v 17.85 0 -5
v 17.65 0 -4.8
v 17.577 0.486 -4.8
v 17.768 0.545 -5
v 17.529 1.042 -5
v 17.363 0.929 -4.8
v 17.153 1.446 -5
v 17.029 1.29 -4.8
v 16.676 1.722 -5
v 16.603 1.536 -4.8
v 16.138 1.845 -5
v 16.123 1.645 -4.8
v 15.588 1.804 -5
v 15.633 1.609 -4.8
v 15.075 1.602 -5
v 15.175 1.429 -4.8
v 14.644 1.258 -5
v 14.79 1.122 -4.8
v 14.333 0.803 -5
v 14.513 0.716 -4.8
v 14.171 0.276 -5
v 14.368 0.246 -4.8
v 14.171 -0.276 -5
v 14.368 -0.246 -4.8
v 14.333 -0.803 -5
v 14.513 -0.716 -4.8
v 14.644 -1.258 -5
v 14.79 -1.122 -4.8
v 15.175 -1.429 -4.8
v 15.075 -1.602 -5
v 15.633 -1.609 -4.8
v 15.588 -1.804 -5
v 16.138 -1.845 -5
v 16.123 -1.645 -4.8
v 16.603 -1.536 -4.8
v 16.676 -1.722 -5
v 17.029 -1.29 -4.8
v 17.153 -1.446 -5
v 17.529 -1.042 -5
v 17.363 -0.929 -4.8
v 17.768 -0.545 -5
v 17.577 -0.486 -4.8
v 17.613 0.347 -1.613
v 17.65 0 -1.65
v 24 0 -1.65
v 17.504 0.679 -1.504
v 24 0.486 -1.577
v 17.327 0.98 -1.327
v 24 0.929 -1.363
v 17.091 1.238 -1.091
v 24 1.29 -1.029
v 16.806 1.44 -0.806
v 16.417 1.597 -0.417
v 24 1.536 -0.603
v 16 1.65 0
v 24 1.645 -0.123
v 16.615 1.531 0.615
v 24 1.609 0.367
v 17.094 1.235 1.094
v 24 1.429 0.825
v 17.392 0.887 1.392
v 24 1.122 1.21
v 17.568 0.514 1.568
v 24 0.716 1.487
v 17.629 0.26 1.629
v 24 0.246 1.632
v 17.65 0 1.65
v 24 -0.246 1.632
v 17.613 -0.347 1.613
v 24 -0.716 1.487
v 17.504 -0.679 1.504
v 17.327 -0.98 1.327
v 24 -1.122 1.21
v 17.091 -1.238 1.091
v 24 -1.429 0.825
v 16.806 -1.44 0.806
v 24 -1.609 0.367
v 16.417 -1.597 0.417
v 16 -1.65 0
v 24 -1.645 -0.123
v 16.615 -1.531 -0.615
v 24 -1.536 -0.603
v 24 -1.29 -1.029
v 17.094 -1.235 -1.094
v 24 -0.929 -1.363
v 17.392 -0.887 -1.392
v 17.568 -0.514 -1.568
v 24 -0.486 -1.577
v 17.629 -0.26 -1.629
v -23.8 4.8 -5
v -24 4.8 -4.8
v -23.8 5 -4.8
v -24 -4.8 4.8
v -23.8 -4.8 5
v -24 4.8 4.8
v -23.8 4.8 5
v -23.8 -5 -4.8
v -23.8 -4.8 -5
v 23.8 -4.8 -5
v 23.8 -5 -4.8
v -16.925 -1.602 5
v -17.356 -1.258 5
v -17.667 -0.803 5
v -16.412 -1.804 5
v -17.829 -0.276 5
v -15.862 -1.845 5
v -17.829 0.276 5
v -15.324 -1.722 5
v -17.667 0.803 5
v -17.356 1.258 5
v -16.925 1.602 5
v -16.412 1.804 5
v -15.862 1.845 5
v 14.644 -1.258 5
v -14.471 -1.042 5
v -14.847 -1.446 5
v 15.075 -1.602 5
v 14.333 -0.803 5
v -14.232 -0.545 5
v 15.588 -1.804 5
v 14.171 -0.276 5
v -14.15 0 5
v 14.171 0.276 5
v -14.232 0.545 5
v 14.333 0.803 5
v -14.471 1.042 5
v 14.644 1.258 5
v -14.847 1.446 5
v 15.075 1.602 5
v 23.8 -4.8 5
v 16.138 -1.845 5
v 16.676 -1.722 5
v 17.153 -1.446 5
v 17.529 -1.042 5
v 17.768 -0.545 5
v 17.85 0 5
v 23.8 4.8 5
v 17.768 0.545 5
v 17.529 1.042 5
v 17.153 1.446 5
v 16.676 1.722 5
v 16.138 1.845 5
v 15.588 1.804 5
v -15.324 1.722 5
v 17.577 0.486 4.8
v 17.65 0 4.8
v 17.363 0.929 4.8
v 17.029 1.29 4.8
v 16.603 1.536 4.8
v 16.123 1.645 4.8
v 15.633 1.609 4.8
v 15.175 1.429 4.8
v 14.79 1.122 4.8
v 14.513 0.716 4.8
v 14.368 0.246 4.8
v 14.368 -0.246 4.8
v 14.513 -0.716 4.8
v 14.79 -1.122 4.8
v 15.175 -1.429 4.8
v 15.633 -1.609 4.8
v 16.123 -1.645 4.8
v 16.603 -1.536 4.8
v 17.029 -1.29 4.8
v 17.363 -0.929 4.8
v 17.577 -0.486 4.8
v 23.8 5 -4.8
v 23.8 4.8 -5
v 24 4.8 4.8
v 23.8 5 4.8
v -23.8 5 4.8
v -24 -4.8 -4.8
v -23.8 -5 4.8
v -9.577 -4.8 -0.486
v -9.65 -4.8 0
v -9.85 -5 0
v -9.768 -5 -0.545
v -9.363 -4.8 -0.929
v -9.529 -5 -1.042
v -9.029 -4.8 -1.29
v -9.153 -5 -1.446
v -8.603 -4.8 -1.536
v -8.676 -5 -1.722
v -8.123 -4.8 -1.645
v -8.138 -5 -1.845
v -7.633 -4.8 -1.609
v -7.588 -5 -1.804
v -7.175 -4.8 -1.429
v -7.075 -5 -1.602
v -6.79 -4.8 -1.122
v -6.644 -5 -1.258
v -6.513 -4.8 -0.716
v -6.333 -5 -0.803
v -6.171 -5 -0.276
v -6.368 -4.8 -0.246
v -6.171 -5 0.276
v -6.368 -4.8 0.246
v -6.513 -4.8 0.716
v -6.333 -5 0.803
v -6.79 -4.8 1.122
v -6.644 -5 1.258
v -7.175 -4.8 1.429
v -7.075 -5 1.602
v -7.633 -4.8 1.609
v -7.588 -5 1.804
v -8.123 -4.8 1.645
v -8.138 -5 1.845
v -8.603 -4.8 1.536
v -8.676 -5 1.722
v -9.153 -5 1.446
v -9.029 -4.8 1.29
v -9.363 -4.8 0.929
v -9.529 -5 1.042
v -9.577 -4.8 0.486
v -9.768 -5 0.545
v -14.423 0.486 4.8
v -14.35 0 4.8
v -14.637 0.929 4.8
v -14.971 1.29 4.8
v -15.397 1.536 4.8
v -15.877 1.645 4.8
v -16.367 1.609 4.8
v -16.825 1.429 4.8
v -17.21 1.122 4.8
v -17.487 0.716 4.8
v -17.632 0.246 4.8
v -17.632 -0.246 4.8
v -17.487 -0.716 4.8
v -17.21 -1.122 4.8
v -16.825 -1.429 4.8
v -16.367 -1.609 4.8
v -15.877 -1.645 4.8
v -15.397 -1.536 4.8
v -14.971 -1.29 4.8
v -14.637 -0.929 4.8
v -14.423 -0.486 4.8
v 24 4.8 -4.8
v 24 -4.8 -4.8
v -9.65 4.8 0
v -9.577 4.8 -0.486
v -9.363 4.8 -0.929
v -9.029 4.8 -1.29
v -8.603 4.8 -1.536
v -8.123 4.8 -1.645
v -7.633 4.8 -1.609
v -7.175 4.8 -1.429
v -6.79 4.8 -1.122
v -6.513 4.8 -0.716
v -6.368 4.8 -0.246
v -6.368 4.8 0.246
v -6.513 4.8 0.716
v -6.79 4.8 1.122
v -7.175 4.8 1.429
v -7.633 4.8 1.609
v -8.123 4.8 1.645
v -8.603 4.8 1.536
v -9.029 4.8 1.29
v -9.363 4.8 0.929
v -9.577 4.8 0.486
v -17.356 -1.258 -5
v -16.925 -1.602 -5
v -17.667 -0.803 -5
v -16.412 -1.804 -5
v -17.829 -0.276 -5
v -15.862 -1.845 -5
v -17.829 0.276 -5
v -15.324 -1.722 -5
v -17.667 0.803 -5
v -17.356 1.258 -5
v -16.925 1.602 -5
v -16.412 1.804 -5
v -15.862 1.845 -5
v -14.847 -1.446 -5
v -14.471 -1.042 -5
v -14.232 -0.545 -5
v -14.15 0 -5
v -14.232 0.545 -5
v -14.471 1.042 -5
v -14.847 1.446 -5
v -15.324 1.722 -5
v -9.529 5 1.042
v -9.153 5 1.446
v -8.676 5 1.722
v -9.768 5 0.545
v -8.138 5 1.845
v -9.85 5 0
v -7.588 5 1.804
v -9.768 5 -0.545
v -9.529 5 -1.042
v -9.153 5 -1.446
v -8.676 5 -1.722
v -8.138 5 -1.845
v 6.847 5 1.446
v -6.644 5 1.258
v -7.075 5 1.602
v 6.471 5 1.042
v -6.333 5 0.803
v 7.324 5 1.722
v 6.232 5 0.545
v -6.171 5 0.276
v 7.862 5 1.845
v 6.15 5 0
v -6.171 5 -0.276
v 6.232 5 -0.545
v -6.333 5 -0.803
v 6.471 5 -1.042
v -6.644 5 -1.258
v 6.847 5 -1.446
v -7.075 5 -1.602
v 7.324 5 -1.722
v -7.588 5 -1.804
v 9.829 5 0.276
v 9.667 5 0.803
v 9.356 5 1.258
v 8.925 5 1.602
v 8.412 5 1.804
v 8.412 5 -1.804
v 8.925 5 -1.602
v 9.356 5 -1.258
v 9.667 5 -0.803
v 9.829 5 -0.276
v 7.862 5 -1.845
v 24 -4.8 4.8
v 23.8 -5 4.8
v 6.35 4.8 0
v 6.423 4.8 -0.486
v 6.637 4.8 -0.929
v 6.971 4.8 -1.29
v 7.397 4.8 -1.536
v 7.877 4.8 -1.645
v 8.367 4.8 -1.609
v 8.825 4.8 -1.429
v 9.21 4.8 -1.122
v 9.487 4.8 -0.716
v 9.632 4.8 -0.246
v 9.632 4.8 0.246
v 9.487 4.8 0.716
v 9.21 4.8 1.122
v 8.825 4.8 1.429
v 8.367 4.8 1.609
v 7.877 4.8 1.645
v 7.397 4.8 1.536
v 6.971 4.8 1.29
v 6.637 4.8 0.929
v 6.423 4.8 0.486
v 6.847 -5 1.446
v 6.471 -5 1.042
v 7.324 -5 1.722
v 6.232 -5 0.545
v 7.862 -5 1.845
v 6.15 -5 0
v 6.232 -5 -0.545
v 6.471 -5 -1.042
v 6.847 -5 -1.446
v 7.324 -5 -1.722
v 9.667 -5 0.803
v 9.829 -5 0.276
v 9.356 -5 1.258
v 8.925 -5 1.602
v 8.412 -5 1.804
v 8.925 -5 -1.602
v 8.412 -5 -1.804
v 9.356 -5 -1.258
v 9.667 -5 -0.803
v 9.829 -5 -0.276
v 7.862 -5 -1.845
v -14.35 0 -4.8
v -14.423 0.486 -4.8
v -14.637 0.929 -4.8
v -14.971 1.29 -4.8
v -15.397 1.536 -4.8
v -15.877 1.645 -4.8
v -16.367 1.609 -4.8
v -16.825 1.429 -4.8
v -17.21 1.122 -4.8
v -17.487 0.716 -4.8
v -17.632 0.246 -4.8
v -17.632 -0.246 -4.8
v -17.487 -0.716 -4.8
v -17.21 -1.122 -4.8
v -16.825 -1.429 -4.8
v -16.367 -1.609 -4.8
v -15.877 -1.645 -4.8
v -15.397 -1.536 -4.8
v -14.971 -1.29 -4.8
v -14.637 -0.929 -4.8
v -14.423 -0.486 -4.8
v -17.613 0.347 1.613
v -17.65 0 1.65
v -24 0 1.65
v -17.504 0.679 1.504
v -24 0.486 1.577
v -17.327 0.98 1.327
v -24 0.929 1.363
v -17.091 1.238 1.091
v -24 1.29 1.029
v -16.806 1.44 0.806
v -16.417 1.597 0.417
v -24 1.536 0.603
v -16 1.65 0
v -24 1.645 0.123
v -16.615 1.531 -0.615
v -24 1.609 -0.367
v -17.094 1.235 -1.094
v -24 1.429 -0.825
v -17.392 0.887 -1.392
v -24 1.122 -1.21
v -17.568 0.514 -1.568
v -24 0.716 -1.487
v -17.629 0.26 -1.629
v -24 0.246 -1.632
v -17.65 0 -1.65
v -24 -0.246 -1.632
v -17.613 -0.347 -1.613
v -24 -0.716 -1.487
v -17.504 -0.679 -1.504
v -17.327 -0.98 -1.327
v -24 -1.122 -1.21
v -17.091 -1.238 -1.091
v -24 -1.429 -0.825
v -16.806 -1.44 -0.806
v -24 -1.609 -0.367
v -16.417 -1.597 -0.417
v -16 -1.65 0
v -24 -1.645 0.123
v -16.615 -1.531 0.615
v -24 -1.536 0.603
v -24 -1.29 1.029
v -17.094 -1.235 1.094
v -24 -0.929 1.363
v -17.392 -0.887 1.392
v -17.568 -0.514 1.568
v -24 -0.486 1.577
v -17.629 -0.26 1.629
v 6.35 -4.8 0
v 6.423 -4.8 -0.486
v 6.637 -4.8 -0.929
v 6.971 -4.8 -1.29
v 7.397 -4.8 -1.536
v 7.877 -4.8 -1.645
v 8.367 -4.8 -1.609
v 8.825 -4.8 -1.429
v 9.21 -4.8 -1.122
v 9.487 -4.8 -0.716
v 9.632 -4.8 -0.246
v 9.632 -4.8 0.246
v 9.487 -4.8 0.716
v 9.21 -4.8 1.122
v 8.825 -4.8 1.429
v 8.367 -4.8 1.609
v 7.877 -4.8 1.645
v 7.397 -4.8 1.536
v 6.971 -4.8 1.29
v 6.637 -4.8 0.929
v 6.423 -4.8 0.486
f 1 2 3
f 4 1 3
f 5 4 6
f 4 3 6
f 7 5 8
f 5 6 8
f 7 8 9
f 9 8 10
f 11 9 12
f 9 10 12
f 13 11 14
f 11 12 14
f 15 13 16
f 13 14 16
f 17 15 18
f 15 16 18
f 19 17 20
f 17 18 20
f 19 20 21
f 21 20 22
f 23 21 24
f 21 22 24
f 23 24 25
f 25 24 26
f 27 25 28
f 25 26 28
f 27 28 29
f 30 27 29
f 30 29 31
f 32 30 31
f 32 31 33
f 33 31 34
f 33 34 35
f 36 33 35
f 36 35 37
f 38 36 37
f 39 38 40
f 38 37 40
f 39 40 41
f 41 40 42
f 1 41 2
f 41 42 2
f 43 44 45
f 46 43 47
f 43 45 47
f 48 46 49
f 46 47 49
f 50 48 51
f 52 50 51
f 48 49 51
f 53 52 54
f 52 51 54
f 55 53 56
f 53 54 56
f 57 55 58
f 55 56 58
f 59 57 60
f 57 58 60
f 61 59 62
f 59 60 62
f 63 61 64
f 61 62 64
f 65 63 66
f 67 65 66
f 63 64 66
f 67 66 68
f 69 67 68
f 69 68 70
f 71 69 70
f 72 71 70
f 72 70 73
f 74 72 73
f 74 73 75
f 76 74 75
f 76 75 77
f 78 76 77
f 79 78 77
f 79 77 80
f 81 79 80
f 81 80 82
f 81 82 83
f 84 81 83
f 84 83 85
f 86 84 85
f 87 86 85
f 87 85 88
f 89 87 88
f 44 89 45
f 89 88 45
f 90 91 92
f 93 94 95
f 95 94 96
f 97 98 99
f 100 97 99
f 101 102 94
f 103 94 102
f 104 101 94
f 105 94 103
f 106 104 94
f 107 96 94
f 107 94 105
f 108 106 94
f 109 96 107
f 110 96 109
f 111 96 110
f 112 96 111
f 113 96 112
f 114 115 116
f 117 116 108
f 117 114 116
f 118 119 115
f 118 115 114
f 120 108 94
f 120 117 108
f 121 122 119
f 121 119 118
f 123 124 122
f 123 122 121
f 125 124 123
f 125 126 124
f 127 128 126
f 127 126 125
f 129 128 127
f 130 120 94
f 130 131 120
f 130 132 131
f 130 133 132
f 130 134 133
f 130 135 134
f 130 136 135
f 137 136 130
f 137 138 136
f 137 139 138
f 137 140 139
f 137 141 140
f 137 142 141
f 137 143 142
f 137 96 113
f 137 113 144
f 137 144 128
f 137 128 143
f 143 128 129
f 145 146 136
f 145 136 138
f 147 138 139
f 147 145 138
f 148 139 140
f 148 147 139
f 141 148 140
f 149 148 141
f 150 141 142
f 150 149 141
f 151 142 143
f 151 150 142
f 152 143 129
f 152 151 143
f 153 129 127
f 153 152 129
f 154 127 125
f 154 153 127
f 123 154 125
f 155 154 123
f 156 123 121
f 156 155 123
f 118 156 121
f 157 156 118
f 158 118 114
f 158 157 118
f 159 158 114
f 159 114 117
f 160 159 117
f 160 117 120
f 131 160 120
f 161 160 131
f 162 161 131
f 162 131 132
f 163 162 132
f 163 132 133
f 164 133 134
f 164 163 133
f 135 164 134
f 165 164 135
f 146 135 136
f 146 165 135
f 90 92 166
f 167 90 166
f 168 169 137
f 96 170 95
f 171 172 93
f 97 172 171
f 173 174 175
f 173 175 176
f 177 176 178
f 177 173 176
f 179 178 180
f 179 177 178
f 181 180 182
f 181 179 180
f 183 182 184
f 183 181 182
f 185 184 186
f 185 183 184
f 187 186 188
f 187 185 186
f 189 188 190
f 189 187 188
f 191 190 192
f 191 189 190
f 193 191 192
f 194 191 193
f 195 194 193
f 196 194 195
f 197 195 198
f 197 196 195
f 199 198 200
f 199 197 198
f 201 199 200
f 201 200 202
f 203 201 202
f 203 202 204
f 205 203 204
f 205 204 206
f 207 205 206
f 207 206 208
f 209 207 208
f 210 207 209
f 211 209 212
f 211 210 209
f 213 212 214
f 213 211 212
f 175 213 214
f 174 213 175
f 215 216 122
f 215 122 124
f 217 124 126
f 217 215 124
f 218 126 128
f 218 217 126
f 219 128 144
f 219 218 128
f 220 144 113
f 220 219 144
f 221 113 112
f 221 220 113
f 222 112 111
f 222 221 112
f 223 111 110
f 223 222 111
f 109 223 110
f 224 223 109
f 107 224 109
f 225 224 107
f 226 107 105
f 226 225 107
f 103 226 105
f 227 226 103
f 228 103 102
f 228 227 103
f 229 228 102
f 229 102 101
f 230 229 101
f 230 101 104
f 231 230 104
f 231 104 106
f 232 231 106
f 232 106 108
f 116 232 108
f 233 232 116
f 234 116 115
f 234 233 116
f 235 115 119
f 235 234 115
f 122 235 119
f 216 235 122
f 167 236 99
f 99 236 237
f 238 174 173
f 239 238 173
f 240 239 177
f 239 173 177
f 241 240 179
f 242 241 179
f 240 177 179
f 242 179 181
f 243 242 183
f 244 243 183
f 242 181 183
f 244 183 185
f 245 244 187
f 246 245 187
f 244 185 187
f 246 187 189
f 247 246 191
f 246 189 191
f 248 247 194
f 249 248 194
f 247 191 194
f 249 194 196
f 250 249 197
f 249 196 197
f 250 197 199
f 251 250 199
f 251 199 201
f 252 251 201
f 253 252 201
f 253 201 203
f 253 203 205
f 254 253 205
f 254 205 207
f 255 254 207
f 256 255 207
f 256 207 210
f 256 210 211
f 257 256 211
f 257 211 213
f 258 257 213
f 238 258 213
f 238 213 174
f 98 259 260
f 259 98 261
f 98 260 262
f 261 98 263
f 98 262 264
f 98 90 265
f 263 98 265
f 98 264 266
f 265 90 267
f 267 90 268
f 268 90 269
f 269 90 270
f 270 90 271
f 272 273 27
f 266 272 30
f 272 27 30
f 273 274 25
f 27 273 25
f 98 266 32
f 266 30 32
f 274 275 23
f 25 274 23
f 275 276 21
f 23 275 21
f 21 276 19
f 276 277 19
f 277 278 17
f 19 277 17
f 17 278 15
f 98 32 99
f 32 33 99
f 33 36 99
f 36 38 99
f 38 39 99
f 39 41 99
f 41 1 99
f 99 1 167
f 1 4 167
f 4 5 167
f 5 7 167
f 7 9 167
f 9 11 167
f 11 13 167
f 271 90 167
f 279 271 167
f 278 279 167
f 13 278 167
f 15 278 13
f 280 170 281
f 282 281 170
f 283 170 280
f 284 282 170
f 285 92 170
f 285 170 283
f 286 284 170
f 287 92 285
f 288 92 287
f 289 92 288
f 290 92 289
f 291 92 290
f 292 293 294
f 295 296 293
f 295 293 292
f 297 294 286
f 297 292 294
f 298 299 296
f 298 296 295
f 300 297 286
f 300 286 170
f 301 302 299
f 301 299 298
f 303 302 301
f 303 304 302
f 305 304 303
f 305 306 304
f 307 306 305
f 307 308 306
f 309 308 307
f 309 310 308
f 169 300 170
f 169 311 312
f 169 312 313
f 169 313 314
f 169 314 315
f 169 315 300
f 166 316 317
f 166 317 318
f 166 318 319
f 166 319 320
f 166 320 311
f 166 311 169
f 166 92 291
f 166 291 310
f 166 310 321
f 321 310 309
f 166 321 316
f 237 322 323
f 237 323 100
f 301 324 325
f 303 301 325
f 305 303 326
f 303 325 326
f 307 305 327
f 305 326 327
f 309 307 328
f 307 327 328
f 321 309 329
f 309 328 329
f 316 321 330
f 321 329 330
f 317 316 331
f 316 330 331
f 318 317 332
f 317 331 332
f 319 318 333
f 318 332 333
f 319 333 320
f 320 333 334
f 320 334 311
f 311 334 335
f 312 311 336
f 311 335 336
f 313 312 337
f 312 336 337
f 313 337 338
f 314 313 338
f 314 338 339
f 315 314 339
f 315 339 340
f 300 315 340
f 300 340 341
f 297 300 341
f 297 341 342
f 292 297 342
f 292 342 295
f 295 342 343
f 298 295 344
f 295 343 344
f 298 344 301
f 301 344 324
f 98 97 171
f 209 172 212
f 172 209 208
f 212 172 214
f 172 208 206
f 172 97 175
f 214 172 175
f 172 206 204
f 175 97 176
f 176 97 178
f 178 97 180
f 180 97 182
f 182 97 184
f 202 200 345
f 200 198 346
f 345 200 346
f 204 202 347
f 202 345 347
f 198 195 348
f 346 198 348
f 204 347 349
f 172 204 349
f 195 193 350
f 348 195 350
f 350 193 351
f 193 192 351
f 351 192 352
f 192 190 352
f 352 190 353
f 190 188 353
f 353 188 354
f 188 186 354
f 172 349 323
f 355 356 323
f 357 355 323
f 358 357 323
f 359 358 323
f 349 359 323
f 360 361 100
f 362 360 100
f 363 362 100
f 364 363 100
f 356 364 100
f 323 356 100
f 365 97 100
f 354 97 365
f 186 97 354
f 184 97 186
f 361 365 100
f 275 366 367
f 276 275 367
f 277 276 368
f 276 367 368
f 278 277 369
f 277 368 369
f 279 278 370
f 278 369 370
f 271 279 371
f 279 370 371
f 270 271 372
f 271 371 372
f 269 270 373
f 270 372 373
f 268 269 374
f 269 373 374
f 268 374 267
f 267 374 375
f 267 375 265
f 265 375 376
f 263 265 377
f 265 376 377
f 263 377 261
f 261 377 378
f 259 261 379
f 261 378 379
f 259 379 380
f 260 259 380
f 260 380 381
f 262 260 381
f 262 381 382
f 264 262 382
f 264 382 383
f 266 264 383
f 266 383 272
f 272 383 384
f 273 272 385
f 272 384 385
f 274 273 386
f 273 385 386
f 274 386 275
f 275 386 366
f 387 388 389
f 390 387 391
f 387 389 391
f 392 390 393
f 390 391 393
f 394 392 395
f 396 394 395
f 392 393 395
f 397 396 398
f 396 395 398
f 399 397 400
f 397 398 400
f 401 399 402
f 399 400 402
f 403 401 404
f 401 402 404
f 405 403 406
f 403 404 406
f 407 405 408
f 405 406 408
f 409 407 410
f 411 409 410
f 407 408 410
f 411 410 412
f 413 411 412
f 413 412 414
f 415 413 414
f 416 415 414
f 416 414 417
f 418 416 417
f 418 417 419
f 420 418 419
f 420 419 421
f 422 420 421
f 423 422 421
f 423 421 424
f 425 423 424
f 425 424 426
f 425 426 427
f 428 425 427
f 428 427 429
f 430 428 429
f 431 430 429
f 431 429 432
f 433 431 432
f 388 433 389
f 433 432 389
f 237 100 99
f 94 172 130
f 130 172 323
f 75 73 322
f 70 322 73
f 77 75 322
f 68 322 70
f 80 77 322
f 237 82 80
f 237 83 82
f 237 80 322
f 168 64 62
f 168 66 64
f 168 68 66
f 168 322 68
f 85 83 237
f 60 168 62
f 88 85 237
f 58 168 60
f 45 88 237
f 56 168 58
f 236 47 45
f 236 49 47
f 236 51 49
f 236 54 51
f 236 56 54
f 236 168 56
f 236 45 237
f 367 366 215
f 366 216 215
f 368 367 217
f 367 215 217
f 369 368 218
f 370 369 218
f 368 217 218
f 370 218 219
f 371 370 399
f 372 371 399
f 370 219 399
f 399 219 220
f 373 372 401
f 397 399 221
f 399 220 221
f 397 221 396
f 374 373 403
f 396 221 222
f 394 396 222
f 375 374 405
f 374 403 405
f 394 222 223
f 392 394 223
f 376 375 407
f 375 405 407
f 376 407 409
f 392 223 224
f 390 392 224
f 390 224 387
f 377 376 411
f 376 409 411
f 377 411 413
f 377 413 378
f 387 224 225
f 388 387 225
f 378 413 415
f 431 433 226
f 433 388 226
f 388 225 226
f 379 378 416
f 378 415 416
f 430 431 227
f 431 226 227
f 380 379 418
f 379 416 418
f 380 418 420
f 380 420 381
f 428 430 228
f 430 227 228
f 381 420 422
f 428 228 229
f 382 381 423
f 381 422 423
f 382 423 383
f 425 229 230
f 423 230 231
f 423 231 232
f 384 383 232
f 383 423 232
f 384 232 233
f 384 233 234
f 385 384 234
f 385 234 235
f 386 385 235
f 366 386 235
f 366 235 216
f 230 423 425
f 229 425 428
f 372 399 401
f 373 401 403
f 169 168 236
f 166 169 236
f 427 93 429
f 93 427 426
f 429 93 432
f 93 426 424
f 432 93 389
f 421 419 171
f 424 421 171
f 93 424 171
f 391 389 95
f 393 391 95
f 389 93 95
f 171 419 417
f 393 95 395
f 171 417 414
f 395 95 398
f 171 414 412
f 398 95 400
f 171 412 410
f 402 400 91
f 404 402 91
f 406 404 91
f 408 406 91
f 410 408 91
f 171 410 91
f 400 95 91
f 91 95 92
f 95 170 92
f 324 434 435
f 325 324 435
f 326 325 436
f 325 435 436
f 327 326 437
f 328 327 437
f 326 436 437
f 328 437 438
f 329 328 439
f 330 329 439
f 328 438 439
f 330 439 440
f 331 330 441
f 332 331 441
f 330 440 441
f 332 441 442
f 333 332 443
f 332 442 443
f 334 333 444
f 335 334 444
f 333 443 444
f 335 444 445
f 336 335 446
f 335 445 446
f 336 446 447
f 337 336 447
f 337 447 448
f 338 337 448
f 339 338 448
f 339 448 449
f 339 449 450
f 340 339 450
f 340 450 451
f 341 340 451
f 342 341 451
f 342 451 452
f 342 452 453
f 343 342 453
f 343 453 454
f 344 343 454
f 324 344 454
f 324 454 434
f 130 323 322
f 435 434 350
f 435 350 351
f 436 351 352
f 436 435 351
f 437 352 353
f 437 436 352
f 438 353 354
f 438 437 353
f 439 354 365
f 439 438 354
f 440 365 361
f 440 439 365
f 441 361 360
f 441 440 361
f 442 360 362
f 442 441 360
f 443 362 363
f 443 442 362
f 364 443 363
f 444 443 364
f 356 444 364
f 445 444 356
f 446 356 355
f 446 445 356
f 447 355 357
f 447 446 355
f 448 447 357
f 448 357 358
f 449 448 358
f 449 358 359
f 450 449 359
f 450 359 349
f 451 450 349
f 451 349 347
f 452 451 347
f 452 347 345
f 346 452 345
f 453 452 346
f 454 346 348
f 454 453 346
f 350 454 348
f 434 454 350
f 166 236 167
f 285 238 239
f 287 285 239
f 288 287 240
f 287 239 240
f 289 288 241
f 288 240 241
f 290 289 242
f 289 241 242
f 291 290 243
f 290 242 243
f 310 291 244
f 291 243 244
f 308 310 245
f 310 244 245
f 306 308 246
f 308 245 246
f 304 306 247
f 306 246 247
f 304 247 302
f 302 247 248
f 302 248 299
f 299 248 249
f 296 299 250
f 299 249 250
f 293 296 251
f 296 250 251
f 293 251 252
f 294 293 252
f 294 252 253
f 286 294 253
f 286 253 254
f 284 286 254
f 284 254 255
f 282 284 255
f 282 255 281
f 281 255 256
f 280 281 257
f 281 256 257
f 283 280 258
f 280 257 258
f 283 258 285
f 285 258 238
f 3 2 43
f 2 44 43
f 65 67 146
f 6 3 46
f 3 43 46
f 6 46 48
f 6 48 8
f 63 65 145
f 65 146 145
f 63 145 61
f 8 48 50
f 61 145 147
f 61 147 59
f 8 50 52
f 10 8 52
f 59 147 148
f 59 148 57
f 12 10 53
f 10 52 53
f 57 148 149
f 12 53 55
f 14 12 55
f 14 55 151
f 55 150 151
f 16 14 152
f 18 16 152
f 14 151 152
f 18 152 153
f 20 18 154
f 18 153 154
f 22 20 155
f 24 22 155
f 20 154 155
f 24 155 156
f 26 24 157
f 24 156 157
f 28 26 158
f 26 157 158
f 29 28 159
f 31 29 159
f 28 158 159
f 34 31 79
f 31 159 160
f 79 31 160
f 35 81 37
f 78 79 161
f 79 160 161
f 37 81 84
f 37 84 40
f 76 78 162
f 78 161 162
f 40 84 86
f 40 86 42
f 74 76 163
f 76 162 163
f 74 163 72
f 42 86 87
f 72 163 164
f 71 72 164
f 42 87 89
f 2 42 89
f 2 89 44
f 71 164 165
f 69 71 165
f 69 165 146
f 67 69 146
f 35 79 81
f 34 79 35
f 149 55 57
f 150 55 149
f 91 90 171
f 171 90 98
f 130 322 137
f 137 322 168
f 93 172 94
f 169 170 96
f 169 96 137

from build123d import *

# Parameters (mm, degrees)
SKETCH_1_W              = 48
SKETCH_1_H              = 10
EXTRUDE_1_DEPTH         = 5
HOLE_WIZARD_M4_1_D      = 3.3
HOLE_WIZARD_M4_2_D      = 3.3
CHAMFER_1_SIZE          = 0.2
HOLE_WIZARD_M4_3_REACH  = 50.518
HOLE_WIZARD_M4_3_BORE_R = 1.65
HOLE_WIZARD_M4_4_REACH  = 50.518
HOLE_WIZARD_M4_4_BORE_R = 1.65


with BuildPart() as part:
    # 草图1 → 凸台-拉伸1 (new, symmetric)
    with BuildSketch(Plane(origin=(0, 0, 0), x_dir=(1, 0, 0), z_dir=(0, 1, 0))):
        Rectangle(SKETCH_1_W, SKETCH_1_H)
    extrude(amount=EXTRUDE_1_DEPTH, both=True)

    # M4 螺纹孔1 (through all)
    with Locations(Plane(origin=(0, 5, 0), x_dir=(1, 0, 0), z_dir=(0, 1, 0))):
        with Locations((-8, 0), (8, 0)):
            Hole(HOLE_WIZARD_M4_1_D / 2)

    # M4 螺纹孔2 (through all)
    with Locations(Plane(origin=(0, 0, -5), x_dir=(-1, 0, 0), z_dir=(0, 0, -1))):
        with Locations((-16, 0), (16, 0)):
            Hole(HOLE_WIZARD_M4_2_D / 2)

    # 倒角1
    chamfer_1_edges = [part.edges().sort_by_distance(p)[0] for p in [
        (-24, 5, 0),
        (9.65, 5, 0),
        (9.65, -5, 0),
        (0, 5, 5),
        (-6.35, 5, 0),
        (-6.35, -5, 0),
        (-17.65, 0, -5),
        (-17.65, 0, 5),
        (14.35, 0, -5),
        (14.35, 0, 5),
        (24, 5, 0),
        (0, -5, 5),
        (-24, -5, 0),
        (0, -5, -5),
        (24, -5, 0),
        (24, 0, 5),
        (-24, 0, 5),
        (-24, 0, -5),
        (24, 0, -5),
        (0, 5, -5),
    ]]
    chamfer(chamfer_1_edges, length=CHAMFER_1_SIZE)

    # M4 螺纹孔3 bore → M4 螺纹孔3 (cut, up to next)
    with BuildSketch(Plane.ZY.offset(24), mode=Mode.PRIVATE) as hole_wizard_m4_3_sk1:
        Circle(HOLE_WIZARD_M4_3_BORE_R)
    hole_wizard_m4_3_tool1 = extrude(hole_wizard_m4_3_sk1.sketch, amount=-HOLE_WIZARD_M4_3_REACH, mode=Mode.PRIVATE) & part.part
    add(hole_wizard_m4_3_tool1.solids().sort_by_distance((-24, 0, 0))[0], mode=Mode.SUBTRACT)

    # M4 螺纹孔4 bore → M4 螺纹孔4 (cut, up to next)
    with BuildSketch(Plane(origin=(24, 0, 0), x_dir=(0, 0, -1), z_dir=(1, 0, 0)), mode=Mode.PRIVATE) as hole_wizard_m4_4_sk1:
        Circle(HOLE_WIZARD_M4_4_BORE_R)
    hole_wizard_m4_4_tool1 = extrude(hole_wizard_m4_4_sk1.sketch, amount=-HOLE_WIZARD_M4_4_REACH, mode=Mode.PRIVATE) & part.part
    add(hole_wizard_m4_4_tool1.solids().sort_by_distance((24, 0, 0))[0], mode=Mode.SUBTRACT)


solid = part.part
